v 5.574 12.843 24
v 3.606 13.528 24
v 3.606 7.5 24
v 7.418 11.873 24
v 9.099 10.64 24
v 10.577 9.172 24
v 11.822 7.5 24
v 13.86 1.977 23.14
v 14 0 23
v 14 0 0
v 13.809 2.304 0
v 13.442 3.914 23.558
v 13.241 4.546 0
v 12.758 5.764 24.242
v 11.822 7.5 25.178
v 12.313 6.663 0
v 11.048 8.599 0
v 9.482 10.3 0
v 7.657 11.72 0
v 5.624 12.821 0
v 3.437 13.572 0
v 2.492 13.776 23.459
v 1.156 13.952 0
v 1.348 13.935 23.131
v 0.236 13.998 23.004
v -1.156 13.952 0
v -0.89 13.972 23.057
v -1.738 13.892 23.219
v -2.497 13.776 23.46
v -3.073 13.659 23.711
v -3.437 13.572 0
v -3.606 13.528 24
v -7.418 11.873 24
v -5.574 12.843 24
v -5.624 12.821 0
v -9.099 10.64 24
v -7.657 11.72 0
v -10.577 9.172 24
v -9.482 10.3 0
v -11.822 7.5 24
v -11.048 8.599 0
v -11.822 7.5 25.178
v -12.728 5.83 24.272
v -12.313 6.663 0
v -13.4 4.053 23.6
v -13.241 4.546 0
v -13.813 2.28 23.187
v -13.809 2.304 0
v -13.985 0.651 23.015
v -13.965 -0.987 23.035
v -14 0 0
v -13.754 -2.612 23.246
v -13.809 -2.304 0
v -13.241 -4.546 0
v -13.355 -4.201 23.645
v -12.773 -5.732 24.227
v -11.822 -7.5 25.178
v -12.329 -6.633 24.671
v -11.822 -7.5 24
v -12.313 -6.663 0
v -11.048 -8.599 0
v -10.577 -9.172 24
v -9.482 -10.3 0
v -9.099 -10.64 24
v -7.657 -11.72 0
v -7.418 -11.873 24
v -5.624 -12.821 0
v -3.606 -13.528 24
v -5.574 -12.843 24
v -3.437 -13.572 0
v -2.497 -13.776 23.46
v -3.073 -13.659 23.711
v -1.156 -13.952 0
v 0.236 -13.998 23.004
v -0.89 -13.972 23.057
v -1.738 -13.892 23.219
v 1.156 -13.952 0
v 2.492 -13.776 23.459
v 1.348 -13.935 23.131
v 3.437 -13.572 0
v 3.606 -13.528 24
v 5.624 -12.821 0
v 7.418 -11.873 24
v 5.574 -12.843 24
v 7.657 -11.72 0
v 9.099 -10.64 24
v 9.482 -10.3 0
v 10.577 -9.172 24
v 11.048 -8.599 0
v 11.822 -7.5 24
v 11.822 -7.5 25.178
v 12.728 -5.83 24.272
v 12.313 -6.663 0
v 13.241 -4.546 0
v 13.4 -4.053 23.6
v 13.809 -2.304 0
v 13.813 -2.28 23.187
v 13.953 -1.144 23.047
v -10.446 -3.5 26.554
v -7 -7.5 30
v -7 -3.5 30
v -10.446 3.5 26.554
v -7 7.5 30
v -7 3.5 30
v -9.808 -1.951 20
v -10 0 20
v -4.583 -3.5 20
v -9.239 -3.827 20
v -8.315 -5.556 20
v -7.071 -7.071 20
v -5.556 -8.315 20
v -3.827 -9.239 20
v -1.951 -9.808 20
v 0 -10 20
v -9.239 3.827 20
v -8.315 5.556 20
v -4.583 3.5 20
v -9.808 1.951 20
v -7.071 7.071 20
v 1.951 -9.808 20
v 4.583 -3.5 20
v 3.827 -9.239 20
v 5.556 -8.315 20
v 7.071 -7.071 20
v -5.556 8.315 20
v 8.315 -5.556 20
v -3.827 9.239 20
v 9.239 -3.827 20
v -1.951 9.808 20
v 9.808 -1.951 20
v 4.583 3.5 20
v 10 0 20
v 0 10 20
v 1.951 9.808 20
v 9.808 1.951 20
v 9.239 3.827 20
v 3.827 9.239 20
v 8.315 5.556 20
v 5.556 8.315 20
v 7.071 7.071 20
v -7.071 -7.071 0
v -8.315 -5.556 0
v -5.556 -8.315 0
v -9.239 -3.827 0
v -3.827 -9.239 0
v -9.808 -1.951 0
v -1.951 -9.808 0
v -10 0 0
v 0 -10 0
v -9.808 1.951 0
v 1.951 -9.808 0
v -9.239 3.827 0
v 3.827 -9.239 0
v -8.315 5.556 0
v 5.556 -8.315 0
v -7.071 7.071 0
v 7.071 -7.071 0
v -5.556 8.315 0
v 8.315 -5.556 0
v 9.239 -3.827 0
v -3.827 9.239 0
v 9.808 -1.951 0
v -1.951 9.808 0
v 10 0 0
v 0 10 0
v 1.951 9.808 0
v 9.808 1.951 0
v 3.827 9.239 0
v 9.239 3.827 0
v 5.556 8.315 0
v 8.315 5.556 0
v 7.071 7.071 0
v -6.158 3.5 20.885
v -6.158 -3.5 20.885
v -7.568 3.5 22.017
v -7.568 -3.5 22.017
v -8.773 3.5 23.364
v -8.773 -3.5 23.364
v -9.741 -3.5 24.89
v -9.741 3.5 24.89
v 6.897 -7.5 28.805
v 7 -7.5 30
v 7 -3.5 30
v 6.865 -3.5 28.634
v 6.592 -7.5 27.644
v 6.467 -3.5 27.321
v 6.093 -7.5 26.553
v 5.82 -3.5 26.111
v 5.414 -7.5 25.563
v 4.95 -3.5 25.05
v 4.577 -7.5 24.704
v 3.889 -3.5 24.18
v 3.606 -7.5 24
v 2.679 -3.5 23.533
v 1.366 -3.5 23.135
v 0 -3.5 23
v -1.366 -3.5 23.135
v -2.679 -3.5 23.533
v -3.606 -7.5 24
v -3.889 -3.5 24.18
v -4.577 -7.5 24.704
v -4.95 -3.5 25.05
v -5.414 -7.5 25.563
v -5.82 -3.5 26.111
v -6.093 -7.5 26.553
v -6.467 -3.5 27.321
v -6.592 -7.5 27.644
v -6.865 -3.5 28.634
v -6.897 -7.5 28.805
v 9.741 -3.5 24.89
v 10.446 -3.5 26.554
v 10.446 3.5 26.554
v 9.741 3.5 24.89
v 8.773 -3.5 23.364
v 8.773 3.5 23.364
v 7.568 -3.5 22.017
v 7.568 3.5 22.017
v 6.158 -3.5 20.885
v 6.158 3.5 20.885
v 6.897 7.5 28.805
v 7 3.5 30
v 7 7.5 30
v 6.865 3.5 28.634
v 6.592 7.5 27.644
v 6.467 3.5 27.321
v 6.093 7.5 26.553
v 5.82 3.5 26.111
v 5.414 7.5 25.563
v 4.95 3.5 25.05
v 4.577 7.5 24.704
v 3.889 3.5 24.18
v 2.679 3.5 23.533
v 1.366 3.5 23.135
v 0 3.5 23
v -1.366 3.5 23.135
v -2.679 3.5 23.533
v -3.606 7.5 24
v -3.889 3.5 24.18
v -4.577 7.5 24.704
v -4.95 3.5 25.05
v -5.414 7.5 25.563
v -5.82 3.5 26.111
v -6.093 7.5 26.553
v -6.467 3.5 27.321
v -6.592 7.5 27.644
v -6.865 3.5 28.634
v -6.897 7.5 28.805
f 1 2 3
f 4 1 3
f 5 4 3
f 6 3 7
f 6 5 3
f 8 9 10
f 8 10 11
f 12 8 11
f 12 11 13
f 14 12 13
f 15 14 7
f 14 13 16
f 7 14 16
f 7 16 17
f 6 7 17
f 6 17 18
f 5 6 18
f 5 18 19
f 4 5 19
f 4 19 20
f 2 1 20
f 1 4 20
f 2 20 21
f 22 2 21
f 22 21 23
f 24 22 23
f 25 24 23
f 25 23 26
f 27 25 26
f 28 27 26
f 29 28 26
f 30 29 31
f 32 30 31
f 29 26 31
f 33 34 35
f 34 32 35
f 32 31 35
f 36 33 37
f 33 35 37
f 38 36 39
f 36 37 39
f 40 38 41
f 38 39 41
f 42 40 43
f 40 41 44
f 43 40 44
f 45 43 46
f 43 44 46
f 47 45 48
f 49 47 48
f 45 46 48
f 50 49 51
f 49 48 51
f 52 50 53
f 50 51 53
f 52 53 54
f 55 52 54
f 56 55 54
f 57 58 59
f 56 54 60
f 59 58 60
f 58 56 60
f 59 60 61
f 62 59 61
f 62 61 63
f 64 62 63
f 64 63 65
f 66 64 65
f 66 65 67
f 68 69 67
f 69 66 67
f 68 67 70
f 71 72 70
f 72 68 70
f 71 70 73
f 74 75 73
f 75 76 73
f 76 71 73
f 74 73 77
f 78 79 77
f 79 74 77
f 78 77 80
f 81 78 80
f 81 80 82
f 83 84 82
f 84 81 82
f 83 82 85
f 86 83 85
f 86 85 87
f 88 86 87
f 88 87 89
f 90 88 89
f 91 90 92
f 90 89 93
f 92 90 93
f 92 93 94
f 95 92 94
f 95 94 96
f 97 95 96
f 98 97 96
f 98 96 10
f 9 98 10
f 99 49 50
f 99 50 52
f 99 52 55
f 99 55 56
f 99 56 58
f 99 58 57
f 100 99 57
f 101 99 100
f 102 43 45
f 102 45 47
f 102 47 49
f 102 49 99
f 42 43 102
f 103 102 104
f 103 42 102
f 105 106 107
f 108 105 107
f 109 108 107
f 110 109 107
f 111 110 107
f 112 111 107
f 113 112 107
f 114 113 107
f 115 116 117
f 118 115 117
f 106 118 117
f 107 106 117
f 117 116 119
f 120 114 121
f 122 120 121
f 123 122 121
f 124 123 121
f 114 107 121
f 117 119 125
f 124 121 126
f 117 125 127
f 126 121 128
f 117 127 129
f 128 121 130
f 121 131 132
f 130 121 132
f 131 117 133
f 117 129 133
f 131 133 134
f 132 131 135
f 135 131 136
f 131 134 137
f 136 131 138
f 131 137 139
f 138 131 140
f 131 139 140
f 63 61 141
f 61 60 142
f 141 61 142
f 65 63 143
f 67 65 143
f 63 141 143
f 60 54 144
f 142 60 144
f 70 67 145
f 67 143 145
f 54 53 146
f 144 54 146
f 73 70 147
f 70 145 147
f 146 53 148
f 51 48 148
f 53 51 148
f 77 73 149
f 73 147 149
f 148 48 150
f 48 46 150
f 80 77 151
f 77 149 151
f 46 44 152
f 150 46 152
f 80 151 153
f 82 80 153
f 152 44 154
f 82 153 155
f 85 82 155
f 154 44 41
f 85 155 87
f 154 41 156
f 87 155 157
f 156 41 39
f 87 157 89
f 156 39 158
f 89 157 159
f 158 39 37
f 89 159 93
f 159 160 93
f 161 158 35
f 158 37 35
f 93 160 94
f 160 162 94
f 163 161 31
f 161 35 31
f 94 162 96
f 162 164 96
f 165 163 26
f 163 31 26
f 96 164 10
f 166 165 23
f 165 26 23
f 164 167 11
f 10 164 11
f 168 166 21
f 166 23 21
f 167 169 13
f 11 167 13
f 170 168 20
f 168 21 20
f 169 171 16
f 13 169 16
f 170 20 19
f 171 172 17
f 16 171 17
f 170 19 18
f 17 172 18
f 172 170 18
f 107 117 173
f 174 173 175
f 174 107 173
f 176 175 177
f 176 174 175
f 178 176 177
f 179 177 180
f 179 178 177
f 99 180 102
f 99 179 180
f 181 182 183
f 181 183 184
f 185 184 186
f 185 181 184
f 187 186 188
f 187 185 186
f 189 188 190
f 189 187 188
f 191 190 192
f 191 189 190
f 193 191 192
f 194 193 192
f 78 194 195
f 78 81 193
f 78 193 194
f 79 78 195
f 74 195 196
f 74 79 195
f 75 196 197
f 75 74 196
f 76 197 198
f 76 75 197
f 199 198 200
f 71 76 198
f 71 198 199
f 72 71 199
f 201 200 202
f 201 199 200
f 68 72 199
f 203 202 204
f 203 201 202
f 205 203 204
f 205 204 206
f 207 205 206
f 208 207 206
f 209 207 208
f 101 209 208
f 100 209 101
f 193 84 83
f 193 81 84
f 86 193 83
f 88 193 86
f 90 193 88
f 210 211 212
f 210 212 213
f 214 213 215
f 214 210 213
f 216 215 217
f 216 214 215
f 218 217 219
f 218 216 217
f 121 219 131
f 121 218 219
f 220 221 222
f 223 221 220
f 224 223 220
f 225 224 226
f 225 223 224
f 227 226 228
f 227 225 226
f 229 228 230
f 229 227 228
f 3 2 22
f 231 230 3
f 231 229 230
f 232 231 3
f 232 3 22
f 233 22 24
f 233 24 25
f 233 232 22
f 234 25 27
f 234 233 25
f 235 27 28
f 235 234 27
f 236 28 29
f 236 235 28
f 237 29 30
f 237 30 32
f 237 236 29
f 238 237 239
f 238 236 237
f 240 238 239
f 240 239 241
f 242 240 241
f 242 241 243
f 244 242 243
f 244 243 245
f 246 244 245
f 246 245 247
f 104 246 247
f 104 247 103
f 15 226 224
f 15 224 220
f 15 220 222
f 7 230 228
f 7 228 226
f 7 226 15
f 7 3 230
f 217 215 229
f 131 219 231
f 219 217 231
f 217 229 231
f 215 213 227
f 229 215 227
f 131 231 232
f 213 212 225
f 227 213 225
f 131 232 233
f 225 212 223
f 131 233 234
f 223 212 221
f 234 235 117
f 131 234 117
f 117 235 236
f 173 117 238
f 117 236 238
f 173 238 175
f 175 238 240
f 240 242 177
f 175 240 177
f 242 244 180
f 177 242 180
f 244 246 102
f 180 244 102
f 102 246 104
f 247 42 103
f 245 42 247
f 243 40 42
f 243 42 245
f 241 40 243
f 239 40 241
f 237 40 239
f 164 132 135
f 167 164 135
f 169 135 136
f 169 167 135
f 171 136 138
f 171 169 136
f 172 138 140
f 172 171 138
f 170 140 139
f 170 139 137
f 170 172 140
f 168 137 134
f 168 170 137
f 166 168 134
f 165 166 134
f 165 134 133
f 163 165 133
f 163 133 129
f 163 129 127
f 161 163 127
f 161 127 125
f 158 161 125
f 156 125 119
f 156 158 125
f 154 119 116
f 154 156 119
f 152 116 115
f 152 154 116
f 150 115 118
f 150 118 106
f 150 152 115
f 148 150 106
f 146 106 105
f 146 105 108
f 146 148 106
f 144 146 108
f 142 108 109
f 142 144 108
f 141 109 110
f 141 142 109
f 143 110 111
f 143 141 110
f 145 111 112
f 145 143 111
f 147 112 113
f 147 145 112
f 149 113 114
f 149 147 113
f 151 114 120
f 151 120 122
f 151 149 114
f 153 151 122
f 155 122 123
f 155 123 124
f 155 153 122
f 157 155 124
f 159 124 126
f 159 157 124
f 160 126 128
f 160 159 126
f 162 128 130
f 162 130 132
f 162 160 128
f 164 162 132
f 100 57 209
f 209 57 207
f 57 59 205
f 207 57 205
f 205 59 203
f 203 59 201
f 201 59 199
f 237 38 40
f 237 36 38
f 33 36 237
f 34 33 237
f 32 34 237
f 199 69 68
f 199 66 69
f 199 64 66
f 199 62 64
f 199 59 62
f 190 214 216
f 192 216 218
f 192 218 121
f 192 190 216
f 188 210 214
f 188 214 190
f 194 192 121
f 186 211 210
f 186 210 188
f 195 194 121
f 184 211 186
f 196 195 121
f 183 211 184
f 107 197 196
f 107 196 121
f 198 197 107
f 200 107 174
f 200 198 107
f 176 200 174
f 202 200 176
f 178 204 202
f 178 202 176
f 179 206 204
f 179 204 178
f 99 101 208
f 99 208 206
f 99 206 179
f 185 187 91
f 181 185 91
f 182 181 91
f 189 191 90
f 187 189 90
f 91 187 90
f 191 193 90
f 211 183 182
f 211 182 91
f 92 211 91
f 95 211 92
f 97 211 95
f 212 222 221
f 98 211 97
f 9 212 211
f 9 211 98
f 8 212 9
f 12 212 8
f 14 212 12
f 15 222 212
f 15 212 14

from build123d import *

# Parameters (mm, degrees)
CYLINDER001_R               = 11
CYLINDER001_DEPTH           = 7
CYLINDER001_ROLL_ANGLE      = 90
CYLINDER001_PLACEMENT_ANGLE = 180
CYLINDER003_R               = 7
CYLINDER003_DEPTH           = 30
CYLINDER003_ROLL_ANGLE      = -90
BOX001_W                    = 30
BOX001_H                    = 10
BOX001_DEPTH                = 6
BOX002_W                    = 30
BOX002_H                    = 10
BOX002_DEPTH                = 6
CYLINDER_R                  = 10
CYLINDER_DEPTH              = 20
PAD001_DEPTH                = 14
PAD001_DEPTH_BACK           = -14
CYLINDER002_R               = 14
CYLINDER002_DEPTH           = 30


with BuildPart() as bearing:
    # Cylinder001 → Cylinder001 (new body)
    with BuildSketch(Plane.XY):
        Circle(CYLINDER001_R)
    extrude(amount=CYLINDER001_DEPTH)


with BuildPart() as bearing_1:
    # Cylinder001 roll: moved
    add(bearing.part.rotate(Axis((0, 0, 0), (1, 0, 0)), CYLINDER001_ROLL_ANGLE))


with BuildPart() as bearing_2:
    # Cylinder001 placement: moved
    add(bearing_1.part.moved(Location((0, -3.5, 30))).rotate(Axis((0, -3.5, 30), (0, 0, 1)), CYLINDER001_PLACEMENT_ANGLE))


with BuildPart() as cylinder001:
    # Cylinder003 → Cylinder003 (new body)
    with BuildSketch(Plane.XY):
        Circle(CYLINDER003_R)
    extrude(amount=CYLINDER003_DEPTH)


with BuildPart() as cylinder001_1:
    # Cylinder003 roll: moved
    add(cylinder001.part.rotate(Axis((0, 0, 0), (1, 0, 0)), CYLINDER003_ROLL_ANGLE))


with BuildPart() as cylinder001_2:
    # Cylinder003 placement: moved
    add(cylinder001_1.part.moved(Location((0, -15, 30))))


with BuildPart() as cube001:
    # Box001 → Box001 (new body)
    with BuildSketch(Plane(origin=(-15, -17.5, 24), x_dir=(1, 0, 0), z_dir=(0, 0, 1))):
        with Locations((15, 5)):
            Rectangle(BOX001_W, BOX001_H)
    extrude(amount=BOX001_DEPTH)


with BuildPart() as cube002:
    # Box002 → Box002 (new body)
    with BuildSketch(Plane(origin=(-15, 7.5, 24), x_dir=(1, 0, 0), z_dir=(0, 0, 1))):
        with Locations((15, 5)):
            Rectangle(BOX002_W, BOX002_H)
    extrude(amount=BOX002_DEPTH)


with BuildPart() as negative_fusion:
    # Cylinder → Cylinder (new body)
    with BuildSketch(Plane.XY):
        Circle(CYLINDER_R)
    extrude(amount=CYLINDER_DEPTH)

    # Fusion: union Bearing, Cylinder001, Cube001, Cube002
    add(bearing_2.part)
    add(cylinder001_2.part)
    add(cube001.part)
    add(cube002.part)


with BuildPart() as body001:
    # Sketch001 → Pad001 (new body, two sides)
    with BuildSketch(Plane.XZ) as pad001_sk:
        Polygon((-7, 0), (7, 0), (15, -8), (15, -30), (-15, -30), (-15, -8), align=None)
    extrude(amount=-PAD001_DEPTH)
    extrude(pad001_sk.sketch, amount=-PAD001_DEPTH_BACK)


with BuildPart() as body001_1:
    # Body001 placement: moved
    add(body001.part.moved(Location((0, 0, 30))))


with BuildPart() as cut:
    # Cylinder002 → Cylinder002 (new body)
    with BuildSketch(Plane.XY):
        Circle(CYLINDER002_R)
    extrude(amount=CYLINDER002_DEPTH)

    # Common: intersect Body001
    add(body001_1.part, mode=Mode.INTERSECT)

    # Cut: cut Negative Fusion
    add(negative_fusion.part, mode=Mode.SUBTRACT)


solid = cut.part
